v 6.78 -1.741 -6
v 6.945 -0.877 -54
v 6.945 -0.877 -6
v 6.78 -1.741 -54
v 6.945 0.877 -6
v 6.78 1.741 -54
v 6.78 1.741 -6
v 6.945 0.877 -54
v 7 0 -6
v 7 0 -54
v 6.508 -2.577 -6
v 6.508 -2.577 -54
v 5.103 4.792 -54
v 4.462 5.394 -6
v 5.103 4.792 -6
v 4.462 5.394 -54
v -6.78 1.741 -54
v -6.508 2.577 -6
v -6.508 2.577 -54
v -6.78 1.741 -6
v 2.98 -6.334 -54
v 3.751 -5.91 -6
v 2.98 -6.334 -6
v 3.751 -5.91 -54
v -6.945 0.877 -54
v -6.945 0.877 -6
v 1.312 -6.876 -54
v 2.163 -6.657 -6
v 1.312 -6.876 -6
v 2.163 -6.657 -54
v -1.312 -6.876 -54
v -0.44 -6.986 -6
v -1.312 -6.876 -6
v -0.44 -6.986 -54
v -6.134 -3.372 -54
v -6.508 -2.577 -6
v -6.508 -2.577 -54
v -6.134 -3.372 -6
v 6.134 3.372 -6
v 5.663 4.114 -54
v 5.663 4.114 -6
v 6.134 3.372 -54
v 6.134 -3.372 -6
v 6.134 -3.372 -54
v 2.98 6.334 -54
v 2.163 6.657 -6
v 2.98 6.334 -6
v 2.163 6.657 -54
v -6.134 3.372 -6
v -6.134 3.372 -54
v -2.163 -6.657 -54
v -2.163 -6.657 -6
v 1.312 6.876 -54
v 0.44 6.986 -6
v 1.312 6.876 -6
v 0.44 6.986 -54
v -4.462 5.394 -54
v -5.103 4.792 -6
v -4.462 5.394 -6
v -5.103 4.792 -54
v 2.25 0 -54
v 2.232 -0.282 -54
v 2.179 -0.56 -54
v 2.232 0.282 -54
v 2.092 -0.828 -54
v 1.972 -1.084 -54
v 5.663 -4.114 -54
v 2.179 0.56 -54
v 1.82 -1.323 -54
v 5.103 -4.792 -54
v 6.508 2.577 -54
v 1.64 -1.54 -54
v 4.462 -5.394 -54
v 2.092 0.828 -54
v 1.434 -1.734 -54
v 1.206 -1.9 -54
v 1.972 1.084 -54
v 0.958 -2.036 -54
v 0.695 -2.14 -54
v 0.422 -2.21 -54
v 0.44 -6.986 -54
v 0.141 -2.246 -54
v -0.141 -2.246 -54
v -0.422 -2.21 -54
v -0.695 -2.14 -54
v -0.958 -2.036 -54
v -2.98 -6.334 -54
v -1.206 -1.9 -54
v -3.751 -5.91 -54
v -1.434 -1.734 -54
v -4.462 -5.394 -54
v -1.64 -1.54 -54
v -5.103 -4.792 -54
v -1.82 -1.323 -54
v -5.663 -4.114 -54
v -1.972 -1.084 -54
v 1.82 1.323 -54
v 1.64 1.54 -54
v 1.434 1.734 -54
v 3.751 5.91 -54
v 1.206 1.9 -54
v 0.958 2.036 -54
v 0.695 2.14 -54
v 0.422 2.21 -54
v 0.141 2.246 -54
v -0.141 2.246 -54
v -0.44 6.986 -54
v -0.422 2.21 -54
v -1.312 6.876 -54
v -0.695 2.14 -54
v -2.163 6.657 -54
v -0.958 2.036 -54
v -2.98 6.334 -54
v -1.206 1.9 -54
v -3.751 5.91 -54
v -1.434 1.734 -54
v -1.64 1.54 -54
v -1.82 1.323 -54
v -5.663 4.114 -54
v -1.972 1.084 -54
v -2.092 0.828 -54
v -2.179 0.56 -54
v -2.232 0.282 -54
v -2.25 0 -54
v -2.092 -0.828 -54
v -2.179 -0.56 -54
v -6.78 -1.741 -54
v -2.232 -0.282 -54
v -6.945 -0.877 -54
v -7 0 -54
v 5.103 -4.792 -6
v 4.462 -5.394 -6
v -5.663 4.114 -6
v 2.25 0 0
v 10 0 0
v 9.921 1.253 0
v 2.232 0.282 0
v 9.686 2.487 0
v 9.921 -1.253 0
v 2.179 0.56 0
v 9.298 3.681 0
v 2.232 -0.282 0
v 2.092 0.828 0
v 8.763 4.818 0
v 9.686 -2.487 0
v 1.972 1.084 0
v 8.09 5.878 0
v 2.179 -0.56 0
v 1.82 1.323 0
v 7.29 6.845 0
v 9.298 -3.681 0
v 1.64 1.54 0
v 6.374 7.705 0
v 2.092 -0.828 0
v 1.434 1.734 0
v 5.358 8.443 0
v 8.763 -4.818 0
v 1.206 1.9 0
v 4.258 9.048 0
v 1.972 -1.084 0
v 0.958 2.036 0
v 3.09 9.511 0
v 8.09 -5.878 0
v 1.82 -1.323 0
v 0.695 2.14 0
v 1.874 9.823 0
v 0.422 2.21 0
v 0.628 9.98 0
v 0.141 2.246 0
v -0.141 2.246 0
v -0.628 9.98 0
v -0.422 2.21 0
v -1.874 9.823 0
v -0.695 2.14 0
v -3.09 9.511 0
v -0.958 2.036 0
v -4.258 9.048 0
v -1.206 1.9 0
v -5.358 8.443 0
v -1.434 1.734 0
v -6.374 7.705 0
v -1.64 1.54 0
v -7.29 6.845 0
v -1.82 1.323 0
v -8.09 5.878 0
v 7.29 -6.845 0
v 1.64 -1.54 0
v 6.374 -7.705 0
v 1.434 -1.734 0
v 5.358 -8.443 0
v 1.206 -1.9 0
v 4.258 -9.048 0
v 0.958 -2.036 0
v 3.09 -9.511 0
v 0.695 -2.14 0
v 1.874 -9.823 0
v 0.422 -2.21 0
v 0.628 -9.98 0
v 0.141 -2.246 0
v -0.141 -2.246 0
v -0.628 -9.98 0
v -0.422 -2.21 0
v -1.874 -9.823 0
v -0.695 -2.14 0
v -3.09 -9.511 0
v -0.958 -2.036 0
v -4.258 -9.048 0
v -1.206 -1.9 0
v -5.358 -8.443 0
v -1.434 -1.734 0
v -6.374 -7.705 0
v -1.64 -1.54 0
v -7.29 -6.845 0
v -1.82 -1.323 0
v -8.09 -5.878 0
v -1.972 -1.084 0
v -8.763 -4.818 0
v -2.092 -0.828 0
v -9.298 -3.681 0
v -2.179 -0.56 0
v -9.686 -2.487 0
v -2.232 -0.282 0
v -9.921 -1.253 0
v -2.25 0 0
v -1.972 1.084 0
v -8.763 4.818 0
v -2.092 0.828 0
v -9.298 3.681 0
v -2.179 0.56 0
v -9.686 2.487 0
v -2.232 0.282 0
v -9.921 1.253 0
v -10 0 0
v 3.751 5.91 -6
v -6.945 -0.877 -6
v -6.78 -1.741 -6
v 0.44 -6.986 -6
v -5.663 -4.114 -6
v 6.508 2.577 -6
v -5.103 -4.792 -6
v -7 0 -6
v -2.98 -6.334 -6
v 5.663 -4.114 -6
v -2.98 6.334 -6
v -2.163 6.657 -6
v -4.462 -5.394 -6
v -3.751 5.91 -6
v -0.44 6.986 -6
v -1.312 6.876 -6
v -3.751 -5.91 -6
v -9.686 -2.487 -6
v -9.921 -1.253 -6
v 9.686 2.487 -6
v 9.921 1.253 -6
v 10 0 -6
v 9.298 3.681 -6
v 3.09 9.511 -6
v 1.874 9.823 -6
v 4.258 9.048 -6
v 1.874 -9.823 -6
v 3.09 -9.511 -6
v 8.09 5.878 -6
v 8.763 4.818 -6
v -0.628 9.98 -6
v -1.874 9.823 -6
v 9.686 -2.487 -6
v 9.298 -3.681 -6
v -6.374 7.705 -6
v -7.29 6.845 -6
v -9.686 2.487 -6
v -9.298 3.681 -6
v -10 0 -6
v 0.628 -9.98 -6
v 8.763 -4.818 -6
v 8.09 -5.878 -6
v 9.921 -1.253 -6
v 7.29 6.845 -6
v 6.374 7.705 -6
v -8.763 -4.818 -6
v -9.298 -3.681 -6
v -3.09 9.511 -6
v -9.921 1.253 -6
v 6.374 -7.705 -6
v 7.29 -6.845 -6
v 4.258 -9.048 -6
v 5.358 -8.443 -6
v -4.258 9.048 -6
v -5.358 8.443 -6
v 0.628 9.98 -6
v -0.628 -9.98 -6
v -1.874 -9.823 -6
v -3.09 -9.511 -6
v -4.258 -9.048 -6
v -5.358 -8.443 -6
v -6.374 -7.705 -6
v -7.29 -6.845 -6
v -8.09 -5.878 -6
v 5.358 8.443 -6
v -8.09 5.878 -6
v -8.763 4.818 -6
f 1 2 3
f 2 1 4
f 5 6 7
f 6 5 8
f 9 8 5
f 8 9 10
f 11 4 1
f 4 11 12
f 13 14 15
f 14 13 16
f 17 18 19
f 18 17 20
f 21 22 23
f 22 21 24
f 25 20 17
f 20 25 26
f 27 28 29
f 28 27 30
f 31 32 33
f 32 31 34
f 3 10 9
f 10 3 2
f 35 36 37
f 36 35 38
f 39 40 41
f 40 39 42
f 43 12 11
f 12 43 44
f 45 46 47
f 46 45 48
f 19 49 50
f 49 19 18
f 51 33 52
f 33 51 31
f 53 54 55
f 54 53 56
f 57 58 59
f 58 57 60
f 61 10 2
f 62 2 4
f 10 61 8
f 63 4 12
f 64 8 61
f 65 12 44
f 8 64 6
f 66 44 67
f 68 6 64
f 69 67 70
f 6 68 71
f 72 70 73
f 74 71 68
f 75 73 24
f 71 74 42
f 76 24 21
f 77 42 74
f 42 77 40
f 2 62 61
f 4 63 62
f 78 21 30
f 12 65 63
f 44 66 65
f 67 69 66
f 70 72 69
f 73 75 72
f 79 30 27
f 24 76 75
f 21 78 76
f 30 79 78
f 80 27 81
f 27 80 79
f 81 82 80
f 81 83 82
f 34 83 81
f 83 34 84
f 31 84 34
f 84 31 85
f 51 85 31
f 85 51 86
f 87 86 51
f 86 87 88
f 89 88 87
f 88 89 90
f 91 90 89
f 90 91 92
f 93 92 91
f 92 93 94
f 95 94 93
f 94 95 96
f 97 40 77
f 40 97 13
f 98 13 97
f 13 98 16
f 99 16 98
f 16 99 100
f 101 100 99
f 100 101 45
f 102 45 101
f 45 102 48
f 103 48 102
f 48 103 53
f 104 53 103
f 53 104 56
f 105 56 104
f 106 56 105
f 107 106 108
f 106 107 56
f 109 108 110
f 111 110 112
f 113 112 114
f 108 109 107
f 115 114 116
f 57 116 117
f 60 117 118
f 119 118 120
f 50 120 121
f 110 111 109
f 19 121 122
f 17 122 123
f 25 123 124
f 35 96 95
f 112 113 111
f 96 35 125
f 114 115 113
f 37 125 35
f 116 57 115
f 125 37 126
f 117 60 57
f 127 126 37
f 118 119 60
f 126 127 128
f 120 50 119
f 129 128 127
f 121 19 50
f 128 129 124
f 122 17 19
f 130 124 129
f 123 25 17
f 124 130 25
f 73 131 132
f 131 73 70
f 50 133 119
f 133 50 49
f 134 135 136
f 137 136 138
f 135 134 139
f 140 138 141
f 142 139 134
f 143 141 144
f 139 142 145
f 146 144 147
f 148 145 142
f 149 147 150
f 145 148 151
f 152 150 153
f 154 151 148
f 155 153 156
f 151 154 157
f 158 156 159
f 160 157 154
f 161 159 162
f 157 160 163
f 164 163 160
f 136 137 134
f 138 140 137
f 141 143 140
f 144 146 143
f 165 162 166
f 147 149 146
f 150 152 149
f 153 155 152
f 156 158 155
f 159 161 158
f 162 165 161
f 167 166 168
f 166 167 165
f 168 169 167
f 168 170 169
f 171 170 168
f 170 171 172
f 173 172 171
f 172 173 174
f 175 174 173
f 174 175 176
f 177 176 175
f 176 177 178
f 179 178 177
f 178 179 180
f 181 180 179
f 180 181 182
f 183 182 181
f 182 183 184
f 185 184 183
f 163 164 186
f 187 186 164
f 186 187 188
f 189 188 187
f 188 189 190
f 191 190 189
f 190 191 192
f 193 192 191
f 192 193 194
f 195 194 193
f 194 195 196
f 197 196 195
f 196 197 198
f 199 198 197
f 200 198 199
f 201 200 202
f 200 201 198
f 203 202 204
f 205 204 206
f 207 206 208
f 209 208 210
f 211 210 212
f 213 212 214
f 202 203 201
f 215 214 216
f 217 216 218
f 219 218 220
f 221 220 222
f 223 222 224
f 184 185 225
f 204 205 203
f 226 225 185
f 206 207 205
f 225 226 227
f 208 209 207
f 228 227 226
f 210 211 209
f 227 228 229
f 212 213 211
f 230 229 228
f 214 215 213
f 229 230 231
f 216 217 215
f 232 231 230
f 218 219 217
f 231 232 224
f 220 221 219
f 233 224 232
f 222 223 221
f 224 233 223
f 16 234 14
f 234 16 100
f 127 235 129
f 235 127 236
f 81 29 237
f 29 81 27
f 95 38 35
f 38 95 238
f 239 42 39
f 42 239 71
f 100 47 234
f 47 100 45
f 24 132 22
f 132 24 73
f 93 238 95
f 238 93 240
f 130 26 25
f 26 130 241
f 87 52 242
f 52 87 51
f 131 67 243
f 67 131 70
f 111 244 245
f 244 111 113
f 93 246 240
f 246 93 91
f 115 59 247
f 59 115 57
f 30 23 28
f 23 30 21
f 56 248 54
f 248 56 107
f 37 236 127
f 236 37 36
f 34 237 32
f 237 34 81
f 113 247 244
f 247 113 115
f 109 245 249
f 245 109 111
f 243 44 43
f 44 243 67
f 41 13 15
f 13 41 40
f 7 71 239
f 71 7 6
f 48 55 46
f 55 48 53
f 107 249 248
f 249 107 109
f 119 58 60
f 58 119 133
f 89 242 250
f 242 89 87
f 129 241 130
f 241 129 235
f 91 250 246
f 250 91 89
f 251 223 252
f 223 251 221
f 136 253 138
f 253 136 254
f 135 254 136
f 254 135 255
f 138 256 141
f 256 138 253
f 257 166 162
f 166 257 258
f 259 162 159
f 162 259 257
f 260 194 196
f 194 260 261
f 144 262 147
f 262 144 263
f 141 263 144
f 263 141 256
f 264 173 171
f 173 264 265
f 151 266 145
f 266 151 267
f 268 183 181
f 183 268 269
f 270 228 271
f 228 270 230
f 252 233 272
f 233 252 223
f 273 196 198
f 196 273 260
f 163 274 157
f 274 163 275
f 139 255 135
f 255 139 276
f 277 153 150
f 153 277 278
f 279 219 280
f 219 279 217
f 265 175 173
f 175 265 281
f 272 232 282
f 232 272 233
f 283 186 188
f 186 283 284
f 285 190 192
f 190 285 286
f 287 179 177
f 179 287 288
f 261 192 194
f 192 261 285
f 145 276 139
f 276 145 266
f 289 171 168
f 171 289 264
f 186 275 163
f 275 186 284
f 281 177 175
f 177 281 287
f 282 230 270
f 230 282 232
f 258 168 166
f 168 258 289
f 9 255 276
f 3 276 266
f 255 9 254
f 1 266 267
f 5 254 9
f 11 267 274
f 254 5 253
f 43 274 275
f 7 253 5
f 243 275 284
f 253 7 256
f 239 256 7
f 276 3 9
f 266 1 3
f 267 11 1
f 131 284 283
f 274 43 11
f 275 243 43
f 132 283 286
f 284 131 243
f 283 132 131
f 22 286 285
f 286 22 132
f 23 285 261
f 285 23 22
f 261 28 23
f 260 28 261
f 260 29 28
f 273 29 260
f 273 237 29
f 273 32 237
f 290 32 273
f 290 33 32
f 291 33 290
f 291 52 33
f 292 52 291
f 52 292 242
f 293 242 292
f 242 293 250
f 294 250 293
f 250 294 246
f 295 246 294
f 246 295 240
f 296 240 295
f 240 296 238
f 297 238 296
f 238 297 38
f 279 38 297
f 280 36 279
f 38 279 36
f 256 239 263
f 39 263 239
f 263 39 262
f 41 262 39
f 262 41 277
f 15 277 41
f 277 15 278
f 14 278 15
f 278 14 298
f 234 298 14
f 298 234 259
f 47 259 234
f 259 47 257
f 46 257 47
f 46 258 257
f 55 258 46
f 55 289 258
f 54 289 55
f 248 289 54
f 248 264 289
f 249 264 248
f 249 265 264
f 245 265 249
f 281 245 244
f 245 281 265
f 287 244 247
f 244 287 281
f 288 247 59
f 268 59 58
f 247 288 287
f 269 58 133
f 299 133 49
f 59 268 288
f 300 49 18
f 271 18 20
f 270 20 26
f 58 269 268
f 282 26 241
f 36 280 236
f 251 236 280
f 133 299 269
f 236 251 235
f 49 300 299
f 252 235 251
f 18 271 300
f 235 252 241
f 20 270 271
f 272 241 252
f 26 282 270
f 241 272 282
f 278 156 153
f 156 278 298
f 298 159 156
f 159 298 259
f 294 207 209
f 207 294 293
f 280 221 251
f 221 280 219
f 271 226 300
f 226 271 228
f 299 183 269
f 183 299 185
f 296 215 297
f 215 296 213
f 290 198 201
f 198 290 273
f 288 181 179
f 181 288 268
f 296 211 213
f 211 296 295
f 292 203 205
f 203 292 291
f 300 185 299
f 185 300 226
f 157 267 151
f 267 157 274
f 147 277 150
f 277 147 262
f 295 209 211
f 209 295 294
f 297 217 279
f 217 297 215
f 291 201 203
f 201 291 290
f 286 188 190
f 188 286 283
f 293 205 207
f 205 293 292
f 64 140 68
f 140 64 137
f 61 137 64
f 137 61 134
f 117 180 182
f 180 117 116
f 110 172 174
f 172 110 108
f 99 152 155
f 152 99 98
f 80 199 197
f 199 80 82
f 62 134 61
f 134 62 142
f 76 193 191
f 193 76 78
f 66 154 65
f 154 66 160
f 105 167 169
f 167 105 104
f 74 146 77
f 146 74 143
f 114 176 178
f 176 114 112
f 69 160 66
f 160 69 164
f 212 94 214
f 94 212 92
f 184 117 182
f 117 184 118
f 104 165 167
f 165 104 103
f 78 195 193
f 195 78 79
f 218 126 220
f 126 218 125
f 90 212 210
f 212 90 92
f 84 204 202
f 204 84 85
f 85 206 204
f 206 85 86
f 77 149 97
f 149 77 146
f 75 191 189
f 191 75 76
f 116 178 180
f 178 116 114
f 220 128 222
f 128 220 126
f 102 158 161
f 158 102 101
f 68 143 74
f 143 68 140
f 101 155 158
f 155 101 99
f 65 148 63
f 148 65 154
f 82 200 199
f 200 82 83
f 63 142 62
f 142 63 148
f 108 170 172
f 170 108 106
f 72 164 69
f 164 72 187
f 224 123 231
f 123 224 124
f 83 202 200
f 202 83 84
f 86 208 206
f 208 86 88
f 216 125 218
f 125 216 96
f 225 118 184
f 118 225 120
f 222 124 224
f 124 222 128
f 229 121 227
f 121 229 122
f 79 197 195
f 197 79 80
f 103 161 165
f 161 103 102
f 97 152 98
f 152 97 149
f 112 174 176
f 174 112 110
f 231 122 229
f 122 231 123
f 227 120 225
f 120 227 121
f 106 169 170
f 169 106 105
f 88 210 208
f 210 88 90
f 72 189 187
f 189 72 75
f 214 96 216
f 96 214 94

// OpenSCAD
$fn = 50;


difference() {
	union() {
		translate(v = [0, 0, -54.0000000000]) {
			cylinder(h = 54, r = 7.0000000000);
		}
		translate(v = [0, 0, -6.0000000000]) {
			cylinder(h = 6, r = 10.0000000000);
		}
	}
	union() {
		#translate(v = [0, 0, -54]) {
			cylinder(h = 54, r = 2.2500000000);
		}
	}
}
